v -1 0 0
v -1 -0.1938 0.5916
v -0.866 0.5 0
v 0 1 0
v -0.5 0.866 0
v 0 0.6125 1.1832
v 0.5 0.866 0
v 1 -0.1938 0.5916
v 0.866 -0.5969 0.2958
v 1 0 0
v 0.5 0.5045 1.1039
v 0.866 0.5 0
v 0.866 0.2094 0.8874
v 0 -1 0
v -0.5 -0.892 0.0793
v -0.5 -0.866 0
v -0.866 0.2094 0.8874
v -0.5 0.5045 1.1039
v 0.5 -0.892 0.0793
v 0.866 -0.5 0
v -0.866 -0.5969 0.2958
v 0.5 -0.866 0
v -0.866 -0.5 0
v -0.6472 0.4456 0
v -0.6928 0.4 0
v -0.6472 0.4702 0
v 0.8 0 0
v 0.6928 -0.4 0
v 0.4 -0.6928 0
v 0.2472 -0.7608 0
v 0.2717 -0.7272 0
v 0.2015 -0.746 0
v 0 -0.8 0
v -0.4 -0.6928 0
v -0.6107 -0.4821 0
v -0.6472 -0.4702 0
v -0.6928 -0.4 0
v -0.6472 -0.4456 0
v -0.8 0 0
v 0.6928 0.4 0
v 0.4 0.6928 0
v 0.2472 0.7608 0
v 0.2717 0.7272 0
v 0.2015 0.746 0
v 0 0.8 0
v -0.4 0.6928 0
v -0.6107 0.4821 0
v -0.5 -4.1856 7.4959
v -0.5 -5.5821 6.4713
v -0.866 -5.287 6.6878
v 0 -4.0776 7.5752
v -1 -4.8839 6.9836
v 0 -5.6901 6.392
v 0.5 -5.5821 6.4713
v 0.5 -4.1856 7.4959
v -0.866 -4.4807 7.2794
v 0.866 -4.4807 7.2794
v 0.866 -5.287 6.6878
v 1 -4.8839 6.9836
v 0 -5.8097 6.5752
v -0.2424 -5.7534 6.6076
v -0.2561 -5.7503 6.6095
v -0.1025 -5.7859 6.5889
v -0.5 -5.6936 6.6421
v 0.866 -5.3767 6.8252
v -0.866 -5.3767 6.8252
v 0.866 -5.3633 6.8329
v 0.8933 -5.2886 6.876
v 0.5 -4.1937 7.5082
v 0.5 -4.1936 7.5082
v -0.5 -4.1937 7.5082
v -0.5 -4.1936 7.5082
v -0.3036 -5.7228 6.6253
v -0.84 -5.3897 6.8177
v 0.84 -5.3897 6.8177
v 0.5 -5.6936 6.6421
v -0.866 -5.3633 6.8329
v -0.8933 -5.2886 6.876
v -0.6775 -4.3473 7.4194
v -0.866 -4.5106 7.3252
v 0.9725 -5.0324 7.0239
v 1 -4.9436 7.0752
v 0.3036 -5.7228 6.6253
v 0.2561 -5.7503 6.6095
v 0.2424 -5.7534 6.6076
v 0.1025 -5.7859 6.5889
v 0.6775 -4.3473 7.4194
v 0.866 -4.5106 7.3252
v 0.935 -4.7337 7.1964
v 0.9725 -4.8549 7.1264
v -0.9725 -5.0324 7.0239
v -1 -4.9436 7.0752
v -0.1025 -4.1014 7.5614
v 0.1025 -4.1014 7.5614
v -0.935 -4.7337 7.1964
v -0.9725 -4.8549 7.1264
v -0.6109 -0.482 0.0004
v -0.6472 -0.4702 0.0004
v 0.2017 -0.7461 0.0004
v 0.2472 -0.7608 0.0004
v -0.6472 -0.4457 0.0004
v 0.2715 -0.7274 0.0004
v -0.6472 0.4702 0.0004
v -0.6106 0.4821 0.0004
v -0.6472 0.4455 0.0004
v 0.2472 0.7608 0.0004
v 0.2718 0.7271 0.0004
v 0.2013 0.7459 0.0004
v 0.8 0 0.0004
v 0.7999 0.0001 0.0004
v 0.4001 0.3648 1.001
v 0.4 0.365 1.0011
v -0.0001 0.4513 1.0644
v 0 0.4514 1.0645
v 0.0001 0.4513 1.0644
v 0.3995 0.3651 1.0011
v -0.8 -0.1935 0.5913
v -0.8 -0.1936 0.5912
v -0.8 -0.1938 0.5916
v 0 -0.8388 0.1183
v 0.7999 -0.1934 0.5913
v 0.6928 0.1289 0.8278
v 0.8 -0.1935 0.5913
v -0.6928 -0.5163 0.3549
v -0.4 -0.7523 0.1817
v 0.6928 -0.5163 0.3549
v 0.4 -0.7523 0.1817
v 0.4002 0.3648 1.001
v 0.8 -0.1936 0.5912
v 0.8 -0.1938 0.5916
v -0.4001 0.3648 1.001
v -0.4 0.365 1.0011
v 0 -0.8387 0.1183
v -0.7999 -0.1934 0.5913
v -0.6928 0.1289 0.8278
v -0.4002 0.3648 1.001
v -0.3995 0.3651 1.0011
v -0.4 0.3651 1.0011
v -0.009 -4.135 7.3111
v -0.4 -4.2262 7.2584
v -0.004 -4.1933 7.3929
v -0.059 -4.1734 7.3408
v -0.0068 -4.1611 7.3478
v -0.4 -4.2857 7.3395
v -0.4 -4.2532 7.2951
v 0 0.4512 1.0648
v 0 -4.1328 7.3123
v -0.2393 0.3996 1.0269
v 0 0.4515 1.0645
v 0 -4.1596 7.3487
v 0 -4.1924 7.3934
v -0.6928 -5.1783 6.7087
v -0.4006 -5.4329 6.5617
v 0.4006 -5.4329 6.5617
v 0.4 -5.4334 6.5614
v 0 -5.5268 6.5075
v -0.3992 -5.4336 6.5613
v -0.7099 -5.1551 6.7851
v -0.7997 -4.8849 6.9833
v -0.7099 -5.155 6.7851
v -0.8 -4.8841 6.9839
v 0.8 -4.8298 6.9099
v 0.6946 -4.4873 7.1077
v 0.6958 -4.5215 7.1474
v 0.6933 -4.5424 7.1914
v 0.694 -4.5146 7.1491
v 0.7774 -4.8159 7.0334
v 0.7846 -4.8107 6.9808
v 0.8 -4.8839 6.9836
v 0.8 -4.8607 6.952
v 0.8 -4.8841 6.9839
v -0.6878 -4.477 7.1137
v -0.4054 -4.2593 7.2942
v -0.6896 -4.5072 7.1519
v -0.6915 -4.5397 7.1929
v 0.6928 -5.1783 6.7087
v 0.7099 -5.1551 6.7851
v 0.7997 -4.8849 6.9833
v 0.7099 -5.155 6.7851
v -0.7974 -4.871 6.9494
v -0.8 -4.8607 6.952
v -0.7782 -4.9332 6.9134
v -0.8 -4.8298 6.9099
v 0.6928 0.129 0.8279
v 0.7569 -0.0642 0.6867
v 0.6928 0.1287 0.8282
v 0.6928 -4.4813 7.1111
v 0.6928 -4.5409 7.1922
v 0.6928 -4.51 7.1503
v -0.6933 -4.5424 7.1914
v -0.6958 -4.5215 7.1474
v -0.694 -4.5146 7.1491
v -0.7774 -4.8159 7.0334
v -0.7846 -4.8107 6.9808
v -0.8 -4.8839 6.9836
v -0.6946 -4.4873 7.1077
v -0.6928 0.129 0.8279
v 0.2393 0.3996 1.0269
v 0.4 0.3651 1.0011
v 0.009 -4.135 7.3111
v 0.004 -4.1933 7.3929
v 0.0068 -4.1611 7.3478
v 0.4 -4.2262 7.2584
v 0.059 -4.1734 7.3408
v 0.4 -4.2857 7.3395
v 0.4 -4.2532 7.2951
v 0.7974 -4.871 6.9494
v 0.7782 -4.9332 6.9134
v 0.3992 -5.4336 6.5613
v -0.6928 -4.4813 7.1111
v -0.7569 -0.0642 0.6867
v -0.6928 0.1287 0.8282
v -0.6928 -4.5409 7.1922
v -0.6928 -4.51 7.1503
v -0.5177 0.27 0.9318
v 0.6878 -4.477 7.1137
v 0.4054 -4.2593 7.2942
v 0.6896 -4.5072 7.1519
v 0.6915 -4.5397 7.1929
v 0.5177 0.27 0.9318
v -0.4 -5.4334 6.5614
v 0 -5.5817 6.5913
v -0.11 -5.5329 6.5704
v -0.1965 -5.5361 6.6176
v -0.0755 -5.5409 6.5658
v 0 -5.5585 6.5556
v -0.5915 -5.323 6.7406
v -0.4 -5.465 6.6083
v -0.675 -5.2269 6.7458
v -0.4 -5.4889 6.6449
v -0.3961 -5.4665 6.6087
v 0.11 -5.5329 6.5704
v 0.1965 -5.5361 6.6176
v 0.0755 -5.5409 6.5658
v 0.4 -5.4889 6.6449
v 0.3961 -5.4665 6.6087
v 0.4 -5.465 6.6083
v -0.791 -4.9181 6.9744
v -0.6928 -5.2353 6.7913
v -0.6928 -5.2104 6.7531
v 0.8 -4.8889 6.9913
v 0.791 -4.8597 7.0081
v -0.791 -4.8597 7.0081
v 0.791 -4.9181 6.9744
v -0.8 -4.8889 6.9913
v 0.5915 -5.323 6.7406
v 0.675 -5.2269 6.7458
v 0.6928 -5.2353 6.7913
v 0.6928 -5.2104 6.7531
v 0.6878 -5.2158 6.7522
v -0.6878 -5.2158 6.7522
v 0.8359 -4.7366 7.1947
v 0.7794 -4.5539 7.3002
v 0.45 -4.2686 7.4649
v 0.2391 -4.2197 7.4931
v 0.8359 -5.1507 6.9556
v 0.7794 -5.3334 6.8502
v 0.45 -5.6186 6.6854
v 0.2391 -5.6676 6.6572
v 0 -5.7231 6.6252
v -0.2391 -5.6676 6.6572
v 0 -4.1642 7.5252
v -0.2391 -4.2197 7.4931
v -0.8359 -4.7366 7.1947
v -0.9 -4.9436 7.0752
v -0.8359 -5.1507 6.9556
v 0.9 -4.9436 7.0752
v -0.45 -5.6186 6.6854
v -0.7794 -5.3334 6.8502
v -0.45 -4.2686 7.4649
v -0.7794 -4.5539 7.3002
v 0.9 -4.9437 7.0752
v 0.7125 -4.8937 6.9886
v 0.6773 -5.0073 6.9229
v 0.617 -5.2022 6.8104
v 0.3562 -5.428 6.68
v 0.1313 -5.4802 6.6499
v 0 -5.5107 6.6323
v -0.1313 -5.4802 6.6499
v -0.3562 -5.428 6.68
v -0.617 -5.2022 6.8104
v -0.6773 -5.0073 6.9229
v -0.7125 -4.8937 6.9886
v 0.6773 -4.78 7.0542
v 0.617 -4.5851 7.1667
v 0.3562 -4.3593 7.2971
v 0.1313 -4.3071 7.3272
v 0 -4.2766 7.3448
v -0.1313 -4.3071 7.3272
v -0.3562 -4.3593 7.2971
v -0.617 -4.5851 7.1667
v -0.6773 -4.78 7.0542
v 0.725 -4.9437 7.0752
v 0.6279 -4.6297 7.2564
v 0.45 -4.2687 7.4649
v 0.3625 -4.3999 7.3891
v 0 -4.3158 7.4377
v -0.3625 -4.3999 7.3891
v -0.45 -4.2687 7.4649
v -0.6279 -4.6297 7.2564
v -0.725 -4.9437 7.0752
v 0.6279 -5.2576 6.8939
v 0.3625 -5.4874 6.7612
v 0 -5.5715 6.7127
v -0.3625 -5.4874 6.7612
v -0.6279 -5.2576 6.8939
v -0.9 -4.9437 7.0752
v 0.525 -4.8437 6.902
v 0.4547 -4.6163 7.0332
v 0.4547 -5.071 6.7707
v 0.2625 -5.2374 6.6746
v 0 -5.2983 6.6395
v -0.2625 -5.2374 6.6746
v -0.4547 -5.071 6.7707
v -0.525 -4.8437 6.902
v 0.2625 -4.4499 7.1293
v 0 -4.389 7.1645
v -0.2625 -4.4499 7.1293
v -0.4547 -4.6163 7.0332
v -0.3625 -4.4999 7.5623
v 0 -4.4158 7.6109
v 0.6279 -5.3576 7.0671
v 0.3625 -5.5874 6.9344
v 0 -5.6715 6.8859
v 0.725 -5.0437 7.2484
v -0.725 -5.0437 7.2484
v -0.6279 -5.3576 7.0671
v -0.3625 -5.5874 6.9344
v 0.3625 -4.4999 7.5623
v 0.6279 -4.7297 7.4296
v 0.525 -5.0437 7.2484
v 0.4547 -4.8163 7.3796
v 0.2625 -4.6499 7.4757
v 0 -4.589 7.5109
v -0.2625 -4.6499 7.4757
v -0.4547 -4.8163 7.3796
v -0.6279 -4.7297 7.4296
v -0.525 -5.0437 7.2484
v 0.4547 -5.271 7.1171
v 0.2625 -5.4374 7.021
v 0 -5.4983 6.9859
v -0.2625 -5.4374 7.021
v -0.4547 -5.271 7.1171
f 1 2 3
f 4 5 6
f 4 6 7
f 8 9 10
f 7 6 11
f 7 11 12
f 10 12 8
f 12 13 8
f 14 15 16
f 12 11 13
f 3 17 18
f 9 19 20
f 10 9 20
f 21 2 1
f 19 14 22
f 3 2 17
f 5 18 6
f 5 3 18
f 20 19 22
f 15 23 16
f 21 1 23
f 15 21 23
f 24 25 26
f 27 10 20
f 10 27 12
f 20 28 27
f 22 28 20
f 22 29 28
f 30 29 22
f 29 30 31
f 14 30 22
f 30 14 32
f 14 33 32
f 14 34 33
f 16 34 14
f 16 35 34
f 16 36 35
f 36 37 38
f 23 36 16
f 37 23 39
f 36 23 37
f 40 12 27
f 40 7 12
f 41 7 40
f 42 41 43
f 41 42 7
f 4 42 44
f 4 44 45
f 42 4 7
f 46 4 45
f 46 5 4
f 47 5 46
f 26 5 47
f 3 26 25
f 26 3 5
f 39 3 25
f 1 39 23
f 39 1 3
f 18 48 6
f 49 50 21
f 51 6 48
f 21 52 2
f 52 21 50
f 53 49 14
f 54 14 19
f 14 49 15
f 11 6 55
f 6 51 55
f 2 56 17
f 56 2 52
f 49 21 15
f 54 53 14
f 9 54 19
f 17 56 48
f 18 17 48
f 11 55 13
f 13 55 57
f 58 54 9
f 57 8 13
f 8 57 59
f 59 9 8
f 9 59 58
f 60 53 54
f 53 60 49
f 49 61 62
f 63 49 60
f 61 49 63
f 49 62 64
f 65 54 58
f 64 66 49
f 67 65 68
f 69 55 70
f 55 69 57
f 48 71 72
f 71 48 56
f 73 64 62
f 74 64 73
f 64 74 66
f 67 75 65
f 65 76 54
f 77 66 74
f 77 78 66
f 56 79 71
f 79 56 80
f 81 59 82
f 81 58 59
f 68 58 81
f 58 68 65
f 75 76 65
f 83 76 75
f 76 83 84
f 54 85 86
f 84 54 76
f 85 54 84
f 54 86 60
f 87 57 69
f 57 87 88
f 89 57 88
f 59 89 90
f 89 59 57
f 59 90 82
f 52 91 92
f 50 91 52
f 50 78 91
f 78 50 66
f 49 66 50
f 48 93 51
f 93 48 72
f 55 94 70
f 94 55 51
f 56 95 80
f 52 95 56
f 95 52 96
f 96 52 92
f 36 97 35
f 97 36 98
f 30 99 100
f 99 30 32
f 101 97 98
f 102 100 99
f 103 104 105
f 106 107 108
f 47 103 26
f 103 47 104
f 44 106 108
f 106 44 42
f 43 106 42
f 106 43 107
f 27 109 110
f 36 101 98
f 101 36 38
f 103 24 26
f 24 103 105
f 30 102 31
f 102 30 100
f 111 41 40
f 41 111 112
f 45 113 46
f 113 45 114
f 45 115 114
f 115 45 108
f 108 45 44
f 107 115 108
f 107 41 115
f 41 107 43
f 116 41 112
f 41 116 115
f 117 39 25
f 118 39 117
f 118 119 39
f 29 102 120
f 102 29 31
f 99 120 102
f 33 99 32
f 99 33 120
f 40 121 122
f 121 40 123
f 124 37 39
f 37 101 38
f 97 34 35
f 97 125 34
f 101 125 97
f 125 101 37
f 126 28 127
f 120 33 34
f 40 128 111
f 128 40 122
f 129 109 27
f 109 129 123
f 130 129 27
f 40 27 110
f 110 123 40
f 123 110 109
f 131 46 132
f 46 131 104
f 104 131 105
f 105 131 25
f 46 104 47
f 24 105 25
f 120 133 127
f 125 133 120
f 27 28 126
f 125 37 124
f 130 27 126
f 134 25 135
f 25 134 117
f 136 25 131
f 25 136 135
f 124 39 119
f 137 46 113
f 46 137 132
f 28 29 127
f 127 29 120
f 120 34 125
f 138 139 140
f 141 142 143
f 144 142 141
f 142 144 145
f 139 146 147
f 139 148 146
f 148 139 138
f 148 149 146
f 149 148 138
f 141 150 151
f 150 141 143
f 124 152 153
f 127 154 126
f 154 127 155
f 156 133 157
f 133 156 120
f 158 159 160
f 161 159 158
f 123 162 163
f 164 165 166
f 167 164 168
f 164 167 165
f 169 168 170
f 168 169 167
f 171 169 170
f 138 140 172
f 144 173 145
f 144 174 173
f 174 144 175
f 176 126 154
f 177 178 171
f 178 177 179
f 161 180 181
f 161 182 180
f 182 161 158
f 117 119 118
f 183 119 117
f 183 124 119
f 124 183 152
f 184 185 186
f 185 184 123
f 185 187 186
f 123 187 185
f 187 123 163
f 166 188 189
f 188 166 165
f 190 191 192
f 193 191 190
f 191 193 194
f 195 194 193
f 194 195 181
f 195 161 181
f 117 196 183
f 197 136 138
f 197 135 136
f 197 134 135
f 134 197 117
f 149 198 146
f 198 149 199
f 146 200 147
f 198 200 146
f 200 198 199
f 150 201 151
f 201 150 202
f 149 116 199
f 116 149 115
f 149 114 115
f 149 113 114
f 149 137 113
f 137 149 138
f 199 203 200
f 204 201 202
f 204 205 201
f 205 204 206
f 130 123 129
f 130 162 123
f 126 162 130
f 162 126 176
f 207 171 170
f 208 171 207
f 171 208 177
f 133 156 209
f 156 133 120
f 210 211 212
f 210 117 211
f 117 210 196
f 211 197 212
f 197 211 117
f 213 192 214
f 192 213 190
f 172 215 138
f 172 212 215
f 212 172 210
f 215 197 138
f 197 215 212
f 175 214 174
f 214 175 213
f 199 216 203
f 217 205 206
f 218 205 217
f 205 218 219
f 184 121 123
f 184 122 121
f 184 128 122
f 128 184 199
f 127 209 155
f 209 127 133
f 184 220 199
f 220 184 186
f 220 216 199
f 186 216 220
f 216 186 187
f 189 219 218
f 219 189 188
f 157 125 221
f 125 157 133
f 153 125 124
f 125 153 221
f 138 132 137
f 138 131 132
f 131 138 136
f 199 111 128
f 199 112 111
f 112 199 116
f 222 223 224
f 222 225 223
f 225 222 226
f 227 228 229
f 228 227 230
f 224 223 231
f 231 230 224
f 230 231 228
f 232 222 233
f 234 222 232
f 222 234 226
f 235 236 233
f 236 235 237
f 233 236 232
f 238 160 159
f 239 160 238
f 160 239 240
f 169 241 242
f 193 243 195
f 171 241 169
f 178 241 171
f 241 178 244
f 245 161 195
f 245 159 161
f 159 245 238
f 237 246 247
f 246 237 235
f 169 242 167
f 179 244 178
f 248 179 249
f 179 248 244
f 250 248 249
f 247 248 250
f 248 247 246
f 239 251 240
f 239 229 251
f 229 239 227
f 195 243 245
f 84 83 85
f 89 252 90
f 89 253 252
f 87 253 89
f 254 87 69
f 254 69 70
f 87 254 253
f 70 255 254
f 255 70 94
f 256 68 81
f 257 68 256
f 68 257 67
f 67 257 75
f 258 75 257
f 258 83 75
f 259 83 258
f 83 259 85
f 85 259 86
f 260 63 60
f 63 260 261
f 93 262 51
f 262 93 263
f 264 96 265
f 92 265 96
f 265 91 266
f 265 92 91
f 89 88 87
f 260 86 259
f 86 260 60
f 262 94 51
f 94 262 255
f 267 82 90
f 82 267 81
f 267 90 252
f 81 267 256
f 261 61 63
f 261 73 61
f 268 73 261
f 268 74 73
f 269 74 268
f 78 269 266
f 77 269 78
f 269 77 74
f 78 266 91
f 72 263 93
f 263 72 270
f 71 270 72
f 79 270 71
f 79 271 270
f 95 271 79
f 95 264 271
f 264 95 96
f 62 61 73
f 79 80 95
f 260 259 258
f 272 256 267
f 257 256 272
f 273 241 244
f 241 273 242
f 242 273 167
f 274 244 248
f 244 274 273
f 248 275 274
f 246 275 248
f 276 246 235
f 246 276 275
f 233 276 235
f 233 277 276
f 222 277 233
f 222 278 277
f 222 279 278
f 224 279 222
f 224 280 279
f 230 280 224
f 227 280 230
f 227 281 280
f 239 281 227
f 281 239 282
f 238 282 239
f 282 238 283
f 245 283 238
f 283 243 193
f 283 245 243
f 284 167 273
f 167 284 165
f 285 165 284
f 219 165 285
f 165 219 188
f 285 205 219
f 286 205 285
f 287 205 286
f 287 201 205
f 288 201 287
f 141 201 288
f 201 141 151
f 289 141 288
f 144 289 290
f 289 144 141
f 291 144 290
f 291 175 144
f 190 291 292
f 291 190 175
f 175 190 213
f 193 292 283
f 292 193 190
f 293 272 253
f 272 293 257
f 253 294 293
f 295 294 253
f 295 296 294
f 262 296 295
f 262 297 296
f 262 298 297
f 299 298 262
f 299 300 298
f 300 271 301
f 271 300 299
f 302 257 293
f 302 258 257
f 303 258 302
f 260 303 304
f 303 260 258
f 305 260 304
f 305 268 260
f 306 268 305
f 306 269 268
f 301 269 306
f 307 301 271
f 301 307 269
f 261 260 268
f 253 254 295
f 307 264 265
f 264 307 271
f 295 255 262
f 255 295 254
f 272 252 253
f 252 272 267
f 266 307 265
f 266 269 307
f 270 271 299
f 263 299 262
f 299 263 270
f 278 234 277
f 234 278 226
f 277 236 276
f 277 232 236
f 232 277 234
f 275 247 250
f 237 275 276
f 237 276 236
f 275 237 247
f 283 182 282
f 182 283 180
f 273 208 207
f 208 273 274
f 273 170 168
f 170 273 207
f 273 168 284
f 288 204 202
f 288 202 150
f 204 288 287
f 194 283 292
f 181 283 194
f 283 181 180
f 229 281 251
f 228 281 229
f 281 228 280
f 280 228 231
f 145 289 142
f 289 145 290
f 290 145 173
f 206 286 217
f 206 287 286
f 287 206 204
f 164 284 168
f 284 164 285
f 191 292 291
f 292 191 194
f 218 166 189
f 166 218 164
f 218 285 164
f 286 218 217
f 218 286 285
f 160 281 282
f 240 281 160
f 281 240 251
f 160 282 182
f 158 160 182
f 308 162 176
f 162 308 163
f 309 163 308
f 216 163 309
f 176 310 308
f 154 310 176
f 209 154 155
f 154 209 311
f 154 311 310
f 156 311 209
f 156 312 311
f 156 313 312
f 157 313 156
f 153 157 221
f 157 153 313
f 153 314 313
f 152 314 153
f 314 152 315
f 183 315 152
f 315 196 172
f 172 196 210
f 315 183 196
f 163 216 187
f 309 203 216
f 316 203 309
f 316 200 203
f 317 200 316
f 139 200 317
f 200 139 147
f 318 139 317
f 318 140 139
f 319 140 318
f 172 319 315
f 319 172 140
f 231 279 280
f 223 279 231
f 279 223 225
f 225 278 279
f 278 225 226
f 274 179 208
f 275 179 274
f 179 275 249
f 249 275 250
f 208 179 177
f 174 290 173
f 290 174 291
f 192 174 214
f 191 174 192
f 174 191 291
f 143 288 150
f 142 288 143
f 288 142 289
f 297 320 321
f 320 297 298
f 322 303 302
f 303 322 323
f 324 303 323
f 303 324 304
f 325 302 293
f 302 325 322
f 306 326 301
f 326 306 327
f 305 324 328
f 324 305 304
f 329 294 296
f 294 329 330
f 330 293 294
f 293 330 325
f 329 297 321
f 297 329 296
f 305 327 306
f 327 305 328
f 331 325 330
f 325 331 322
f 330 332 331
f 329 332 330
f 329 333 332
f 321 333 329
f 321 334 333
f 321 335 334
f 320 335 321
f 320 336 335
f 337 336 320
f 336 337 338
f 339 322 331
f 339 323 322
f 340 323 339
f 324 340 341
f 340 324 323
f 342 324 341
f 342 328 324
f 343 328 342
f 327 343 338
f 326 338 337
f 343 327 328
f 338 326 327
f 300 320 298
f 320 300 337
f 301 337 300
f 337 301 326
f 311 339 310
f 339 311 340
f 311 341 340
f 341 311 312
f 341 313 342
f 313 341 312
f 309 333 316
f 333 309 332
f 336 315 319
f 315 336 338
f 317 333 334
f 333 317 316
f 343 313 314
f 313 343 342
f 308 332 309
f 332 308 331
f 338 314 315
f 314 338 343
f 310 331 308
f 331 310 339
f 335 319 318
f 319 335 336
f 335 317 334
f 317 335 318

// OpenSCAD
tolerance=0.075;
hole_radius=0.05;
grid_hole_radius=0.05;
outer_radius=1;
thickness=0.2;
hole_attach_height=0.05;
attach_thickness=0.1;

//parameters that don't have to be defined explicitly
eps = tolerance/100;
inner_radius = outer_radius - thickness;
fn = 12;
fnh = 6;

module angled_cylinder(angle_deg_y, _h, _r, angle_deg_x = 0) {
    rotate([angle_deg_x, angle_deg_y, 0]) { // Rotate the cylinder 
            cylinder(h = _h, r = _r, center = true, $fn = fnh);
        }
}

module hole(_h) {
    cylinder(h = _h, r = grid_hole_radius, $fn = fnh);
}

//makes circle of holes
module circular_grid(_h, _r, _n) {
    for (i = [0:_n-1]) {
        angle = i * 360 / _n;
        x_pos = _r * cos(angle);
        y_pos = _r * sin(angle);
        translate([x_pos, y_pos, -eps]) {
            hole(_h);
        }
    }
}

//makes grid of holes
module hole_grid(hole_height, grid_h) {
    translate([0,0,hole_height]) {
        difference() {
            //cylinder
            cylinder(h = grid_h, r = (inner_radius + outer_radius)/2, 
                center=false, $fn = fn);
            //holes
            for (i = [0 : grid_hole_radius * 2 + hole_attach_height : inner_radius - grid_hole_radius * 2]) {
                circular_grid(grid_h + eps*2, i, ceil(6.28*i/(grid_hole_radius*4)));
            }
            
        } 
    }
}

//makes curve of CSC
module curve(_radius, _twist, _turning_angle, _turning_radius) {
    rotate([90,0,_twist])
    translate([-_turning_radius, 0, 0])
    rotate_extrude(angle=_turning_angle, convexity=100, $fn = fn)
    translate([_turning_radius, 0]) circle(_radius);
}

module CSC(_r, _t1, _ta1, _tr1, _h, _t2, _ta2, _tr2, is_inner) {
    
    if (_ta1 > 90) {
        CSC(_r, _t1, 90, _tr1, 0, 0, 0, 0, is_inner);
        
        pos1 = (-_tr1 + sqrt(_tr1*_tr1 - pow(_tr1,2)));
        translate([pos1*cos(_t1),pos1*sin(_t1),_tr1])
        rotate([0,-90,_t1])
        CSC(_r, 0, _ta1 - 90, _tr1, _h, _t2, _ta2, _tr2, is_inner);
    } else if (_ta2 > 90) {
        CSC(_r, _t1, _ta1, _tr1, _h, _t2, 90, _tr2, is_inner);
        
        pos1 = (-_tr1 + sqrt(_tr1*_tr1 - pow(_tr1*sin(_ta1),2)));
        pos2 = (-_tr2 + sqrt(_tr2*_tr2 - pow(_tr2,2)));
        translate([pos1*cos(_t1),pos1*sin(_t1),_tr1*sin(_ta1)])
        rotate([0,-_ta1,_t1])
        translate([0, 0, _h])
        translate([pos2*cos(_t2),pos2*sin(_t2),_tr2])
        rotate([0,-90,_t2])
        CSC(_r, 0, 0, 0, 0, 0, _ta2 - 90, _tr2, is_inner);
    } else {
        //intermediate positions
        pos1 = (-_tr1 + sqrt(_tr1*_tr1 - pow(_tr1*sin(_ta1),2)));
        pos2 = (-_tr2 + sqrt(_tr2*_tr2 - pow(_tr2*sin(_ta2),2)));
        
        union() {
            //bottom shell threshold
            if (is_inner) {
                cylinder(h=eps, r=_r, center=true);
            }
            
            //first curve of CSC
            curve(_r, _t1, _ta1, _tr1);
            
            //straight link of CSC
            translate([pos1*cos(_t1),pos1*sin(_t1),_tr1*sin(_ta1)])
            rotate([0,-_ta1,_t1])
            if (is_inner) {
                //add threshold for shelling
                translate([0,0,-eps /2])
                cylinder(h=_h + eps,r=_r, center = false, $fn= fn);
            } else {
                cylinder(h=_h,r=_r, center = false, $fn= fn);
            }
            
            //second curve of CSC
            translate([pos1*cos(_t1),pos1*sin(_t1),_tr1*sin(_ta1)])
            rotate([0,-_ta1,_t1])
            translate([0, 0, _h])
            curve(_r, _t2, _ta2, _tr2);
            
            //shelling thresholds
            if (is_inner) {
                translate([pos1*cos(_t1),pos1*sin(_t1),_tr1*sin(_ta1)])
                rotate([0,-_ta1,_t1])
                translate([0, 0, _h])
                translate([pos2*cos(_t2),pos2*sin(_t2),_tr2*sin(_ta2)])
                rotate([0,-_ta2,_t2]) {
                    cylinder(h=eps, r=_r, center=true,$fn=fn);
                }
            
            }
        }
    }
    
}

//allow modules to attach
module CSC_ATTACH(_r, _t1, _ta1, _tr1, _h, _t2, _ta2, _tr2, next_hole_radius, next_hole_attach_height, next_inner) {
    
    if (_ta1 > 90) {        
        pos1 = (-_tr1 + sqrt(_tr1*_tr1 - pow(_tr1,2)));
        translate([pos1*cos(_t1),pos1*sin(_t1),_tr1])
        rotate([0,-90,_t1])
        CSC_ATTACH(_r, 0, _ta1 - 90, _tr1, _h, _t2, _ta2, _tr2, next_hole_radius, next_hole_attach_height, next_inner);
    } else if (_ta2 > 90) {        
        pos1 = (-_tr1 + sqrt(_tr1*_tr1 - pow(_tr1*sin(_ta1),2)));
        pos2 = (-_tr2 + sqrt(_tr2*_tr2 - pow(_tr2,2)));
        translate([pos1*cos(_t1),pos1*sin(_t1),_tr1*sin(_ta1)])
        rotate([0,-_ta1,_t1])
        translate([0, 0, _h])
        translate([pos2*cos(_t2),pos2*sin(_t2),_tr2])
        rotate([0,-90,_t2])
        CSC_ATTACH(_r, 0, 0, 0, 0, 0, _ta2 - 90, _tr2, next_hole_radius, next_hole_attach_height, next_inner);
    } else {
        //intermediate positions
        pos1 = (-_tr1 + sqrt(_tr1*_tr1 - pow(_tr1*sin(_ta1),2)));
        pos2 = (-_tr2 + sqrt(_tr2*_tr2 - pow(_tr2*sin(_ta2),2)));
        
        translate([pos1*cos(_t1),pos1*sin(_t1),_tr1*sin(_ta1)])
        rotate([0,-_ta1,_t1])
        translate([0, 0, _h])
        translate([pos2*cos(_t2),pos2*sin(_t2),_tr2*sin(_ta2)])
        rotate([0,-_ta2,_t2]) {
            difference() {
                union() {
                    //attachment for smaller cylinder
                    translate([0,0,-attach_thickness])
                    cylinder(h=attach_thickness, r=_r - thickness/2, $fn=fn);
                    translate([0,0,-attach_thickness*2])
                    cylinder(h=attach_thickness*2, r1=_r - thickness/2, r2=next_inner - tolerance - thickness, $fn=fn);
                    
                    //small cylinder
                    cylinder(h=next_hole_radius*2 + next_hole_attach_height * 2, r = next_inner - tolerance, $fn=fn);
                }
                
                //shelling
                translate([0,0, -attach_thickness*2 - eps/2])
                cylinder(h=next_hole_radius*2 + next_hole_attach_height * 2 + attach_thickness*2 + eps, r = min(inner_radius, next_inner - tolerance - thickness), $fn=fn);
                
                //holes for screws
    //            translate([0,0,next_hole_attach_height + next_hole_radius]) {
    //                angled_cylinder(0, (next_inner + thickness + eps) * 2,  hole_radius, 90);
    //                angled_cylinder(90, (next_inner + thickness + eps) * 2, hole_radius, 0);
    //            }
            }
        }
    }
}

//remove overlap to allow all branches to attach to each other
module CSC_REMOVE_OVERLAP(_r, _t1, _ta1, _tr1, _h, _t2, _ta2, _tr2, next_hole_radius, next_hole_attach_height, next_inner) {
    if (_ta1 > 90) {        
        pos1 = (-_tr1 + sqrt(_tr1*_tr1 - pow(_tr1,2)));
        translate([pos1*cos(_t1),pos1*sin(_t1),_tr1])
        rotate([0,-90,_t1])
        CSC_REMOVE_OVERLAP(_r, 0, _ta1 - 90, _tr1, _h, _t2, _ta2, _tr2, next_hole_radius, next_hole_attach_height, next_inner);
    } else if (_ta2 > 90) {        
        pos1 = (-_tr1 + sqrt(_tr1*_tr1 - pow(_tr1*sin(_ta1),2)));
        pos2 = (-_tr2 + sqrt(_tr2*_tr2 - pow(_tr2,2)));
        translate([pos1*cos(_t1),pos1*sin(_t1),_tr1*sin(_ta1)])
        rotate([0,-_ta1,_t1])
        translate([0, 0, _h])
        translate([pos2*cos(_t2),pos2*sin(_t2),_tr2])
        rotate([0,-90,_t2])
        CSC_REMOVE_OVERLAP(_r, 0, 0, 0, 0, 0, _ta2 - 90, _tr2, next_hole_radius, next_hole_attach_height, next_inner);
    } else {
        pos1 = (-_tr1 + sqrt(_tr1*_tr1 - pow(_tr1*sin(_ta1),2)));
        pos2 = (-_tr2 + sqrt(_tr2*_tr2 - pow(_tr2*sin(_ta2),2)));
        
        translate([pos1*cos(_t1),pos1*sin(_t1),_tr1*sin(_ta1)])
        rotate([0,-_ta1,_t1])
        translate([0, 0, _h])
        translate([pos2*cos(_t2),pos2*sin(_t2),_tr2*sin(_ta2)])
        rotate([0,-_ta2,_t2]) {
            cylinder(h=999999, r=_r + tolerance, $fn=fn);
        }
    }
}

//c is _t1, _ta1, _tr1, _h, _t2, _ta2, _tr2, next hole radius, next hole height, next inner radius
module branch(branch_list, _outer, _inner) {
    union() {
        //make grid of holes
        //hole_grid(hole_radius*2 + hole_attach_height * 2, grid_hole_radius);
        
        //make CSC shells for each CSC in branch_list
        difference() {
            for (c = branch_list) {
                CSC(_outer,c[0],c[1],c[2],c[3],c[4],c[5],c[6], false);
            }
            
            for (c = branch_list) {
                CSC(_inner,c[0],c[1],c[2],c[3],c[4],c[5],c[6], true);
                CSC_REMOVE_OVERLAP(_outer,c[0],c[1],c[2],c[3],c[4],c[5],c[6],c[7], c[8], c[9]);
            }
            
            //make screw holes at the bottom
//            translate([0,0,hole_radius + hole_attach_height]) {
//                angled_cylinder(0, (outer_radius*1.5 + eps) * 2,  hole_radius, 90);
//                angled_cylinder(90, (outer_radius*1.5 + eps) * 2, hole_radius, 0);
//            }    
        }
        for (c=branch_list) {     
            CSC_ATTACH(_outer,c[0],c[1],c[2],c[3],c[4],c[5],c[6], c[7], c[8], c[9]);
        }
    }
}

branch([
[ 90.0, 36.2693, 1.0*outer_radius, 7.9281*outer_radius, 180.0, 6.2693, 1.0*outer_radius, 0.05, 0.05, 0.8],
],outer_radius,inner_radius);
